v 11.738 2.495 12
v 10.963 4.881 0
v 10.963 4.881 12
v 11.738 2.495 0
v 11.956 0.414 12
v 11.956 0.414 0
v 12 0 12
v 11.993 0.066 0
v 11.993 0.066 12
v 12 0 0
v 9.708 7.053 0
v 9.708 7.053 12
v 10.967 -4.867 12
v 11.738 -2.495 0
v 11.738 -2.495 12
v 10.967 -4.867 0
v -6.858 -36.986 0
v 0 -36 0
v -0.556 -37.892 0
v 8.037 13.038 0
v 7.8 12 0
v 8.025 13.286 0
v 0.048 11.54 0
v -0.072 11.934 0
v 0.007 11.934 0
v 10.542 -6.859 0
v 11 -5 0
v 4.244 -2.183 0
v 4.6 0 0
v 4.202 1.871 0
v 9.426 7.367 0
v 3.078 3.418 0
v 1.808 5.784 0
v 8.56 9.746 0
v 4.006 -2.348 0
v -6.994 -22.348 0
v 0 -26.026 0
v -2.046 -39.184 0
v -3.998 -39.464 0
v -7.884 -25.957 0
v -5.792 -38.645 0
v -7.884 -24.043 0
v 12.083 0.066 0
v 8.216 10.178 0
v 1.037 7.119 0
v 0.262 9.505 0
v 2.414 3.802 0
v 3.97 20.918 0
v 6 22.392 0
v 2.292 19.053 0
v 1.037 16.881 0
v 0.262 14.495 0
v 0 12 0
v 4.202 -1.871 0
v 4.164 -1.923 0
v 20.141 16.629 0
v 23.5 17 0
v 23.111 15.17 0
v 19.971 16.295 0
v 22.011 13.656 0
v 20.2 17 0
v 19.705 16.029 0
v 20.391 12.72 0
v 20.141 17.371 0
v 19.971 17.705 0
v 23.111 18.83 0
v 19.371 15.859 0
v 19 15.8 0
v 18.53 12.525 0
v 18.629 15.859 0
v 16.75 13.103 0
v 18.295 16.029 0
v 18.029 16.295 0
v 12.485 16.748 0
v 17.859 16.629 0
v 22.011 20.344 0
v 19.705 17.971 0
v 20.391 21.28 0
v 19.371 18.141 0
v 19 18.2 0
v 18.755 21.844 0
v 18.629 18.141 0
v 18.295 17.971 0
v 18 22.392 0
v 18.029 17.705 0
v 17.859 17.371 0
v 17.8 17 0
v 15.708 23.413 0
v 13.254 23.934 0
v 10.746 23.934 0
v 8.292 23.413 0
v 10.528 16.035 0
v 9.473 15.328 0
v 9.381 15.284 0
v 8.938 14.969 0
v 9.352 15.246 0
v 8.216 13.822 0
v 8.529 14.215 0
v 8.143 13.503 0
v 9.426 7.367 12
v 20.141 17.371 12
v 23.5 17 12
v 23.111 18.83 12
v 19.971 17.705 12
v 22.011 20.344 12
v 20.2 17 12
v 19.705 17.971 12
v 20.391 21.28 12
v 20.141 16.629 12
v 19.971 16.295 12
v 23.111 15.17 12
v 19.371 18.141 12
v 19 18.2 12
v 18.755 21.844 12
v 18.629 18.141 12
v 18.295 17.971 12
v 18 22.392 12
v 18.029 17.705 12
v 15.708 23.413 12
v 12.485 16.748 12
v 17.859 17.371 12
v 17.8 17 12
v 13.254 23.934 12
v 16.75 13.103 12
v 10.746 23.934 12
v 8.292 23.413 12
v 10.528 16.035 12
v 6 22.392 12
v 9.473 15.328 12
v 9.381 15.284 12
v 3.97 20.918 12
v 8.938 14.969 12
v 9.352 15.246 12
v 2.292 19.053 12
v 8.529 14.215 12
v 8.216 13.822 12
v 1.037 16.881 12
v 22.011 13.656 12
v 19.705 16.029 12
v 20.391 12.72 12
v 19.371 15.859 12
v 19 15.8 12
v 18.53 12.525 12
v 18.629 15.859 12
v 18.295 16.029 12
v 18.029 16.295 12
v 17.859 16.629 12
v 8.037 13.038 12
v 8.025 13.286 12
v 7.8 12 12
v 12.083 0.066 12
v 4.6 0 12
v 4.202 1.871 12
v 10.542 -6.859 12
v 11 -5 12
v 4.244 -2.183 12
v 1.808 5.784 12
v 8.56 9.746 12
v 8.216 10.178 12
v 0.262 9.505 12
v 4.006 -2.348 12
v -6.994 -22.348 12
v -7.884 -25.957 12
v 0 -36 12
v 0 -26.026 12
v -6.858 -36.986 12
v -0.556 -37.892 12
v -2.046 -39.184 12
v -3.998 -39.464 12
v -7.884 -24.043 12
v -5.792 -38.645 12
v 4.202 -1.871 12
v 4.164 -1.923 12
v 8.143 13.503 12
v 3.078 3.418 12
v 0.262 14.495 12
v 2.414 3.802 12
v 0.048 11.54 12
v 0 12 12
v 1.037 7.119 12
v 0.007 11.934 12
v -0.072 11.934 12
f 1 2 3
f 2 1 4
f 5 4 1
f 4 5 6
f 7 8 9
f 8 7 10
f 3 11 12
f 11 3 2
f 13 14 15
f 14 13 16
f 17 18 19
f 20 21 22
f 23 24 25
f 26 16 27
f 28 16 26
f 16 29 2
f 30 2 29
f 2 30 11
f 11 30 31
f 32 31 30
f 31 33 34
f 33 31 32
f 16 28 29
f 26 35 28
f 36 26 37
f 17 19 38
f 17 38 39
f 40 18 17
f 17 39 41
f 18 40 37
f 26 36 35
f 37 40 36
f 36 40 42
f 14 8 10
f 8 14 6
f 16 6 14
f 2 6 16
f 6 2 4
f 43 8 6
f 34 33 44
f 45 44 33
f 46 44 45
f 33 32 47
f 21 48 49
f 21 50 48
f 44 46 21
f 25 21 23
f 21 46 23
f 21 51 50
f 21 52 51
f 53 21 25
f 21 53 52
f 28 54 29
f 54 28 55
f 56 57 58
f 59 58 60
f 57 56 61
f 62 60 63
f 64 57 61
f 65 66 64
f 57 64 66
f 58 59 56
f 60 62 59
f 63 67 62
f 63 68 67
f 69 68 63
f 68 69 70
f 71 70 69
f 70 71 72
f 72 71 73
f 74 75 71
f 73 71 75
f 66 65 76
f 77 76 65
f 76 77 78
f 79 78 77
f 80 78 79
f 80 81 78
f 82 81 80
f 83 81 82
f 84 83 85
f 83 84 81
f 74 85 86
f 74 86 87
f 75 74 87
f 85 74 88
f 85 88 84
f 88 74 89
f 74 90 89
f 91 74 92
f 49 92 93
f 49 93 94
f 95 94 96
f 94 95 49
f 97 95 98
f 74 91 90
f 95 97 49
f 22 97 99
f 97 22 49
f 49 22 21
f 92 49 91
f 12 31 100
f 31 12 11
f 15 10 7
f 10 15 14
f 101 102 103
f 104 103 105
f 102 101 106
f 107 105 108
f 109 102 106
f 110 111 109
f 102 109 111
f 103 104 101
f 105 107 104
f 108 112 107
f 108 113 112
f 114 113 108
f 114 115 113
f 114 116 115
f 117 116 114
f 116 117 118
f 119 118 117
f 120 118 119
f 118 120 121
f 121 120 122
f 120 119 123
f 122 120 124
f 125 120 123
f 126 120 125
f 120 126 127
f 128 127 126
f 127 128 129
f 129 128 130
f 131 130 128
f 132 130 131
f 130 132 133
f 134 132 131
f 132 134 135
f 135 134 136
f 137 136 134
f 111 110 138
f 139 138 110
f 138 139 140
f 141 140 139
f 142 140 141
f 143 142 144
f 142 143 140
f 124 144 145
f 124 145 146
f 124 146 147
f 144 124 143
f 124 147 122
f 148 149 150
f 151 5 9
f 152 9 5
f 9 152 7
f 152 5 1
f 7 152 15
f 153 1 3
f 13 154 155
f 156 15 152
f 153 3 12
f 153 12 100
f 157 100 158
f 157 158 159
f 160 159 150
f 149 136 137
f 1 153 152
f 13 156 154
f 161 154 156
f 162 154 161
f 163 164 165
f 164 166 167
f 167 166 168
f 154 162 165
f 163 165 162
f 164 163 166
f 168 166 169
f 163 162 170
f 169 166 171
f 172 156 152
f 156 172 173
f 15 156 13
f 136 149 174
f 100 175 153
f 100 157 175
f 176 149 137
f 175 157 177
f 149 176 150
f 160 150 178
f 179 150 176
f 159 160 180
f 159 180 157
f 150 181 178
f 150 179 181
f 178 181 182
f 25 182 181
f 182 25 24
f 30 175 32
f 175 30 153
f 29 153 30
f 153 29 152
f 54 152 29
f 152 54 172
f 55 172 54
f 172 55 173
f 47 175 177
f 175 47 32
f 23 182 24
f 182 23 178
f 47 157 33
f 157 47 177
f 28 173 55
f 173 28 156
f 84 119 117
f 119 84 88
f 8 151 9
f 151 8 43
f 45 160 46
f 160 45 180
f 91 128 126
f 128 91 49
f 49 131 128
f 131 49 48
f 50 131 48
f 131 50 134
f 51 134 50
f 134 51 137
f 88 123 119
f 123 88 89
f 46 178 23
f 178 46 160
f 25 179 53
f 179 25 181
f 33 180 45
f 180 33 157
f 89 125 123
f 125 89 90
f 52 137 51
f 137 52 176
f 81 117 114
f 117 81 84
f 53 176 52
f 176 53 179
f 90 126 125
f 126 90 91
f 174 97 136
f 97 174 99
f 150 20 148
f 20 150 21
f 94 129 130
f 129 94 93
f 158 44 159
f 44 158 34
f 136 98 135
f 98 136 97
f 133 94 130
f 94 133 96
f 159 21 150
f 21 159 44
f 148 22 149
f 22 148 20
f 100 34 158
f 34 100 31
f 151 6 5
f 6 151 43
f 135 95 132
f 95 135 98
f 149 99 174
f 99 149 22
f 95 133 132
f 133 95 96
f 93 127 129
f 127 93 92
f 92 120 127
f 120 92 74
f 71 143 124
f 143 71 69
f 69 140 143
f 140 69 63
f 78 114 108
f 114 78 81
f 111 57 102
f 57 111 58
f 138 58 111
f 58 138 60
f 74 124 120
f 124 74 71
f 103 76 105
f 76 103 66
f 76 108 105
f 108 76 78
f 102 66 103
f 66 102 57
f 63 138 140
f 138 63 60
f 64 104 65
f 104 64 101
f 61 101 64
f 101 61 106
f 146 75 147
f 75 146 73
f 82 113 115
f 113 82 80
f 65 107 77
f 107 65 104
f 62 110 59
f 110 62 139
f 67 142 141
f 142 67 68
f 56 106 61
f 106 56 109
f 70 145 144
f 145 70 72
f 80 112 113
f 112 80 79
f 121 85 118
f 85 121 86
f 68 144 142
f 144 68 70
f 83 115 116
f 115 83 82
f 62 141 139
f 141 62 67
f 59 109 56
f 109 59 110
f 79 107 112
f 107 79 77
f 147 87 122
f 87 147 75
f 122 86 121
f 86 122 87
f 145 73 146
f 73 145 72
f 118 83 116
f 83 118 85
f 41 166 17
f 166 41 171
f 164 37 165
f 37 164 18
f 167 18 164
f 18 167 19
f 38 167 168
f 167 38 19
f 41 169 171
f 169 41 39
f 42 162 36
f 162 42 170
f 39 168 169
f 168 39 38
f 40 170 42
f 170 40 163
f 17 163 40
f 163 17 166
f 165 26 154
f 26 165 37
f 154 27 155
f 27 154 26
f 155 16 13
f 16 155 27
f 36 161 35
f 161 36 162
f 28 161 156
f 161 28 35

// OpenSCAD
// ShipsBoatA
// Parts to mate fiberglass pole onto bike rack
// Fiberglass 8 mm diameter
// Bikerack 8.4 mm, more like 9 near bends

// Back
H=12.0;      // height to extrude

difference(){
    cylinder(r=12,h=H);
    cylinder(r=4.6,h=H);

    color("pink")    
    translate([-9,-8.5,0]) rotate([0,0,45])
    linear_extrude(height=H+0.1) 
    offset(r=4)
    square(size=[12,12]);

    color("cyan")    
    translate([-7,-15,0]) rotate([0,0,17])
    linear_extrude(height=H+0.1) square(size=[14.5,26]);
    
}


translate([12,12,0])
difference(){
    cylinder(r=12,h=H);
    cylinder(r=4.2,h=H);

    color("orange")    
    translate([4,-11,0]) rotate([0,0,20])
    linear_extrude(height=H+0.1) 
    offset(r=4)
    square(size=[10,12]);

/*
    color("purple")    
    translate([8.5-11,6-9,0]) rotate([0,0,75])
    linear_extrude(height=H+0.1) square(size=[6,13]);
    */
}


    hull(){
        color("red")    
        translate([-3.5,-36,0]) 
        cylinder(r=3.5,h=H);

        color("red")    
        translate([-4,-25,0]) 
        cylinder(r=4,h=H);
    }
  
    hull(){
        color("red")    
        translate([-4,-25,0]) 
        cylinder(r=4,h=H);

        color("red")    
        translate([7,-5,0]) 
        cylinder(r=4,h=H);
    }

    difference(){
    hull(){
        color("red")    
        translate([12,21,0]) 
        cylinder(r=3.0,h=H);

        color("red")    
        translate([19,17,0]) 
        cylinder(r=4.5,h=H);
    }
        color("red")    
        translate([19,17,0]) 
        cylinder(r=1.2,h=H,$fn=20);

}
